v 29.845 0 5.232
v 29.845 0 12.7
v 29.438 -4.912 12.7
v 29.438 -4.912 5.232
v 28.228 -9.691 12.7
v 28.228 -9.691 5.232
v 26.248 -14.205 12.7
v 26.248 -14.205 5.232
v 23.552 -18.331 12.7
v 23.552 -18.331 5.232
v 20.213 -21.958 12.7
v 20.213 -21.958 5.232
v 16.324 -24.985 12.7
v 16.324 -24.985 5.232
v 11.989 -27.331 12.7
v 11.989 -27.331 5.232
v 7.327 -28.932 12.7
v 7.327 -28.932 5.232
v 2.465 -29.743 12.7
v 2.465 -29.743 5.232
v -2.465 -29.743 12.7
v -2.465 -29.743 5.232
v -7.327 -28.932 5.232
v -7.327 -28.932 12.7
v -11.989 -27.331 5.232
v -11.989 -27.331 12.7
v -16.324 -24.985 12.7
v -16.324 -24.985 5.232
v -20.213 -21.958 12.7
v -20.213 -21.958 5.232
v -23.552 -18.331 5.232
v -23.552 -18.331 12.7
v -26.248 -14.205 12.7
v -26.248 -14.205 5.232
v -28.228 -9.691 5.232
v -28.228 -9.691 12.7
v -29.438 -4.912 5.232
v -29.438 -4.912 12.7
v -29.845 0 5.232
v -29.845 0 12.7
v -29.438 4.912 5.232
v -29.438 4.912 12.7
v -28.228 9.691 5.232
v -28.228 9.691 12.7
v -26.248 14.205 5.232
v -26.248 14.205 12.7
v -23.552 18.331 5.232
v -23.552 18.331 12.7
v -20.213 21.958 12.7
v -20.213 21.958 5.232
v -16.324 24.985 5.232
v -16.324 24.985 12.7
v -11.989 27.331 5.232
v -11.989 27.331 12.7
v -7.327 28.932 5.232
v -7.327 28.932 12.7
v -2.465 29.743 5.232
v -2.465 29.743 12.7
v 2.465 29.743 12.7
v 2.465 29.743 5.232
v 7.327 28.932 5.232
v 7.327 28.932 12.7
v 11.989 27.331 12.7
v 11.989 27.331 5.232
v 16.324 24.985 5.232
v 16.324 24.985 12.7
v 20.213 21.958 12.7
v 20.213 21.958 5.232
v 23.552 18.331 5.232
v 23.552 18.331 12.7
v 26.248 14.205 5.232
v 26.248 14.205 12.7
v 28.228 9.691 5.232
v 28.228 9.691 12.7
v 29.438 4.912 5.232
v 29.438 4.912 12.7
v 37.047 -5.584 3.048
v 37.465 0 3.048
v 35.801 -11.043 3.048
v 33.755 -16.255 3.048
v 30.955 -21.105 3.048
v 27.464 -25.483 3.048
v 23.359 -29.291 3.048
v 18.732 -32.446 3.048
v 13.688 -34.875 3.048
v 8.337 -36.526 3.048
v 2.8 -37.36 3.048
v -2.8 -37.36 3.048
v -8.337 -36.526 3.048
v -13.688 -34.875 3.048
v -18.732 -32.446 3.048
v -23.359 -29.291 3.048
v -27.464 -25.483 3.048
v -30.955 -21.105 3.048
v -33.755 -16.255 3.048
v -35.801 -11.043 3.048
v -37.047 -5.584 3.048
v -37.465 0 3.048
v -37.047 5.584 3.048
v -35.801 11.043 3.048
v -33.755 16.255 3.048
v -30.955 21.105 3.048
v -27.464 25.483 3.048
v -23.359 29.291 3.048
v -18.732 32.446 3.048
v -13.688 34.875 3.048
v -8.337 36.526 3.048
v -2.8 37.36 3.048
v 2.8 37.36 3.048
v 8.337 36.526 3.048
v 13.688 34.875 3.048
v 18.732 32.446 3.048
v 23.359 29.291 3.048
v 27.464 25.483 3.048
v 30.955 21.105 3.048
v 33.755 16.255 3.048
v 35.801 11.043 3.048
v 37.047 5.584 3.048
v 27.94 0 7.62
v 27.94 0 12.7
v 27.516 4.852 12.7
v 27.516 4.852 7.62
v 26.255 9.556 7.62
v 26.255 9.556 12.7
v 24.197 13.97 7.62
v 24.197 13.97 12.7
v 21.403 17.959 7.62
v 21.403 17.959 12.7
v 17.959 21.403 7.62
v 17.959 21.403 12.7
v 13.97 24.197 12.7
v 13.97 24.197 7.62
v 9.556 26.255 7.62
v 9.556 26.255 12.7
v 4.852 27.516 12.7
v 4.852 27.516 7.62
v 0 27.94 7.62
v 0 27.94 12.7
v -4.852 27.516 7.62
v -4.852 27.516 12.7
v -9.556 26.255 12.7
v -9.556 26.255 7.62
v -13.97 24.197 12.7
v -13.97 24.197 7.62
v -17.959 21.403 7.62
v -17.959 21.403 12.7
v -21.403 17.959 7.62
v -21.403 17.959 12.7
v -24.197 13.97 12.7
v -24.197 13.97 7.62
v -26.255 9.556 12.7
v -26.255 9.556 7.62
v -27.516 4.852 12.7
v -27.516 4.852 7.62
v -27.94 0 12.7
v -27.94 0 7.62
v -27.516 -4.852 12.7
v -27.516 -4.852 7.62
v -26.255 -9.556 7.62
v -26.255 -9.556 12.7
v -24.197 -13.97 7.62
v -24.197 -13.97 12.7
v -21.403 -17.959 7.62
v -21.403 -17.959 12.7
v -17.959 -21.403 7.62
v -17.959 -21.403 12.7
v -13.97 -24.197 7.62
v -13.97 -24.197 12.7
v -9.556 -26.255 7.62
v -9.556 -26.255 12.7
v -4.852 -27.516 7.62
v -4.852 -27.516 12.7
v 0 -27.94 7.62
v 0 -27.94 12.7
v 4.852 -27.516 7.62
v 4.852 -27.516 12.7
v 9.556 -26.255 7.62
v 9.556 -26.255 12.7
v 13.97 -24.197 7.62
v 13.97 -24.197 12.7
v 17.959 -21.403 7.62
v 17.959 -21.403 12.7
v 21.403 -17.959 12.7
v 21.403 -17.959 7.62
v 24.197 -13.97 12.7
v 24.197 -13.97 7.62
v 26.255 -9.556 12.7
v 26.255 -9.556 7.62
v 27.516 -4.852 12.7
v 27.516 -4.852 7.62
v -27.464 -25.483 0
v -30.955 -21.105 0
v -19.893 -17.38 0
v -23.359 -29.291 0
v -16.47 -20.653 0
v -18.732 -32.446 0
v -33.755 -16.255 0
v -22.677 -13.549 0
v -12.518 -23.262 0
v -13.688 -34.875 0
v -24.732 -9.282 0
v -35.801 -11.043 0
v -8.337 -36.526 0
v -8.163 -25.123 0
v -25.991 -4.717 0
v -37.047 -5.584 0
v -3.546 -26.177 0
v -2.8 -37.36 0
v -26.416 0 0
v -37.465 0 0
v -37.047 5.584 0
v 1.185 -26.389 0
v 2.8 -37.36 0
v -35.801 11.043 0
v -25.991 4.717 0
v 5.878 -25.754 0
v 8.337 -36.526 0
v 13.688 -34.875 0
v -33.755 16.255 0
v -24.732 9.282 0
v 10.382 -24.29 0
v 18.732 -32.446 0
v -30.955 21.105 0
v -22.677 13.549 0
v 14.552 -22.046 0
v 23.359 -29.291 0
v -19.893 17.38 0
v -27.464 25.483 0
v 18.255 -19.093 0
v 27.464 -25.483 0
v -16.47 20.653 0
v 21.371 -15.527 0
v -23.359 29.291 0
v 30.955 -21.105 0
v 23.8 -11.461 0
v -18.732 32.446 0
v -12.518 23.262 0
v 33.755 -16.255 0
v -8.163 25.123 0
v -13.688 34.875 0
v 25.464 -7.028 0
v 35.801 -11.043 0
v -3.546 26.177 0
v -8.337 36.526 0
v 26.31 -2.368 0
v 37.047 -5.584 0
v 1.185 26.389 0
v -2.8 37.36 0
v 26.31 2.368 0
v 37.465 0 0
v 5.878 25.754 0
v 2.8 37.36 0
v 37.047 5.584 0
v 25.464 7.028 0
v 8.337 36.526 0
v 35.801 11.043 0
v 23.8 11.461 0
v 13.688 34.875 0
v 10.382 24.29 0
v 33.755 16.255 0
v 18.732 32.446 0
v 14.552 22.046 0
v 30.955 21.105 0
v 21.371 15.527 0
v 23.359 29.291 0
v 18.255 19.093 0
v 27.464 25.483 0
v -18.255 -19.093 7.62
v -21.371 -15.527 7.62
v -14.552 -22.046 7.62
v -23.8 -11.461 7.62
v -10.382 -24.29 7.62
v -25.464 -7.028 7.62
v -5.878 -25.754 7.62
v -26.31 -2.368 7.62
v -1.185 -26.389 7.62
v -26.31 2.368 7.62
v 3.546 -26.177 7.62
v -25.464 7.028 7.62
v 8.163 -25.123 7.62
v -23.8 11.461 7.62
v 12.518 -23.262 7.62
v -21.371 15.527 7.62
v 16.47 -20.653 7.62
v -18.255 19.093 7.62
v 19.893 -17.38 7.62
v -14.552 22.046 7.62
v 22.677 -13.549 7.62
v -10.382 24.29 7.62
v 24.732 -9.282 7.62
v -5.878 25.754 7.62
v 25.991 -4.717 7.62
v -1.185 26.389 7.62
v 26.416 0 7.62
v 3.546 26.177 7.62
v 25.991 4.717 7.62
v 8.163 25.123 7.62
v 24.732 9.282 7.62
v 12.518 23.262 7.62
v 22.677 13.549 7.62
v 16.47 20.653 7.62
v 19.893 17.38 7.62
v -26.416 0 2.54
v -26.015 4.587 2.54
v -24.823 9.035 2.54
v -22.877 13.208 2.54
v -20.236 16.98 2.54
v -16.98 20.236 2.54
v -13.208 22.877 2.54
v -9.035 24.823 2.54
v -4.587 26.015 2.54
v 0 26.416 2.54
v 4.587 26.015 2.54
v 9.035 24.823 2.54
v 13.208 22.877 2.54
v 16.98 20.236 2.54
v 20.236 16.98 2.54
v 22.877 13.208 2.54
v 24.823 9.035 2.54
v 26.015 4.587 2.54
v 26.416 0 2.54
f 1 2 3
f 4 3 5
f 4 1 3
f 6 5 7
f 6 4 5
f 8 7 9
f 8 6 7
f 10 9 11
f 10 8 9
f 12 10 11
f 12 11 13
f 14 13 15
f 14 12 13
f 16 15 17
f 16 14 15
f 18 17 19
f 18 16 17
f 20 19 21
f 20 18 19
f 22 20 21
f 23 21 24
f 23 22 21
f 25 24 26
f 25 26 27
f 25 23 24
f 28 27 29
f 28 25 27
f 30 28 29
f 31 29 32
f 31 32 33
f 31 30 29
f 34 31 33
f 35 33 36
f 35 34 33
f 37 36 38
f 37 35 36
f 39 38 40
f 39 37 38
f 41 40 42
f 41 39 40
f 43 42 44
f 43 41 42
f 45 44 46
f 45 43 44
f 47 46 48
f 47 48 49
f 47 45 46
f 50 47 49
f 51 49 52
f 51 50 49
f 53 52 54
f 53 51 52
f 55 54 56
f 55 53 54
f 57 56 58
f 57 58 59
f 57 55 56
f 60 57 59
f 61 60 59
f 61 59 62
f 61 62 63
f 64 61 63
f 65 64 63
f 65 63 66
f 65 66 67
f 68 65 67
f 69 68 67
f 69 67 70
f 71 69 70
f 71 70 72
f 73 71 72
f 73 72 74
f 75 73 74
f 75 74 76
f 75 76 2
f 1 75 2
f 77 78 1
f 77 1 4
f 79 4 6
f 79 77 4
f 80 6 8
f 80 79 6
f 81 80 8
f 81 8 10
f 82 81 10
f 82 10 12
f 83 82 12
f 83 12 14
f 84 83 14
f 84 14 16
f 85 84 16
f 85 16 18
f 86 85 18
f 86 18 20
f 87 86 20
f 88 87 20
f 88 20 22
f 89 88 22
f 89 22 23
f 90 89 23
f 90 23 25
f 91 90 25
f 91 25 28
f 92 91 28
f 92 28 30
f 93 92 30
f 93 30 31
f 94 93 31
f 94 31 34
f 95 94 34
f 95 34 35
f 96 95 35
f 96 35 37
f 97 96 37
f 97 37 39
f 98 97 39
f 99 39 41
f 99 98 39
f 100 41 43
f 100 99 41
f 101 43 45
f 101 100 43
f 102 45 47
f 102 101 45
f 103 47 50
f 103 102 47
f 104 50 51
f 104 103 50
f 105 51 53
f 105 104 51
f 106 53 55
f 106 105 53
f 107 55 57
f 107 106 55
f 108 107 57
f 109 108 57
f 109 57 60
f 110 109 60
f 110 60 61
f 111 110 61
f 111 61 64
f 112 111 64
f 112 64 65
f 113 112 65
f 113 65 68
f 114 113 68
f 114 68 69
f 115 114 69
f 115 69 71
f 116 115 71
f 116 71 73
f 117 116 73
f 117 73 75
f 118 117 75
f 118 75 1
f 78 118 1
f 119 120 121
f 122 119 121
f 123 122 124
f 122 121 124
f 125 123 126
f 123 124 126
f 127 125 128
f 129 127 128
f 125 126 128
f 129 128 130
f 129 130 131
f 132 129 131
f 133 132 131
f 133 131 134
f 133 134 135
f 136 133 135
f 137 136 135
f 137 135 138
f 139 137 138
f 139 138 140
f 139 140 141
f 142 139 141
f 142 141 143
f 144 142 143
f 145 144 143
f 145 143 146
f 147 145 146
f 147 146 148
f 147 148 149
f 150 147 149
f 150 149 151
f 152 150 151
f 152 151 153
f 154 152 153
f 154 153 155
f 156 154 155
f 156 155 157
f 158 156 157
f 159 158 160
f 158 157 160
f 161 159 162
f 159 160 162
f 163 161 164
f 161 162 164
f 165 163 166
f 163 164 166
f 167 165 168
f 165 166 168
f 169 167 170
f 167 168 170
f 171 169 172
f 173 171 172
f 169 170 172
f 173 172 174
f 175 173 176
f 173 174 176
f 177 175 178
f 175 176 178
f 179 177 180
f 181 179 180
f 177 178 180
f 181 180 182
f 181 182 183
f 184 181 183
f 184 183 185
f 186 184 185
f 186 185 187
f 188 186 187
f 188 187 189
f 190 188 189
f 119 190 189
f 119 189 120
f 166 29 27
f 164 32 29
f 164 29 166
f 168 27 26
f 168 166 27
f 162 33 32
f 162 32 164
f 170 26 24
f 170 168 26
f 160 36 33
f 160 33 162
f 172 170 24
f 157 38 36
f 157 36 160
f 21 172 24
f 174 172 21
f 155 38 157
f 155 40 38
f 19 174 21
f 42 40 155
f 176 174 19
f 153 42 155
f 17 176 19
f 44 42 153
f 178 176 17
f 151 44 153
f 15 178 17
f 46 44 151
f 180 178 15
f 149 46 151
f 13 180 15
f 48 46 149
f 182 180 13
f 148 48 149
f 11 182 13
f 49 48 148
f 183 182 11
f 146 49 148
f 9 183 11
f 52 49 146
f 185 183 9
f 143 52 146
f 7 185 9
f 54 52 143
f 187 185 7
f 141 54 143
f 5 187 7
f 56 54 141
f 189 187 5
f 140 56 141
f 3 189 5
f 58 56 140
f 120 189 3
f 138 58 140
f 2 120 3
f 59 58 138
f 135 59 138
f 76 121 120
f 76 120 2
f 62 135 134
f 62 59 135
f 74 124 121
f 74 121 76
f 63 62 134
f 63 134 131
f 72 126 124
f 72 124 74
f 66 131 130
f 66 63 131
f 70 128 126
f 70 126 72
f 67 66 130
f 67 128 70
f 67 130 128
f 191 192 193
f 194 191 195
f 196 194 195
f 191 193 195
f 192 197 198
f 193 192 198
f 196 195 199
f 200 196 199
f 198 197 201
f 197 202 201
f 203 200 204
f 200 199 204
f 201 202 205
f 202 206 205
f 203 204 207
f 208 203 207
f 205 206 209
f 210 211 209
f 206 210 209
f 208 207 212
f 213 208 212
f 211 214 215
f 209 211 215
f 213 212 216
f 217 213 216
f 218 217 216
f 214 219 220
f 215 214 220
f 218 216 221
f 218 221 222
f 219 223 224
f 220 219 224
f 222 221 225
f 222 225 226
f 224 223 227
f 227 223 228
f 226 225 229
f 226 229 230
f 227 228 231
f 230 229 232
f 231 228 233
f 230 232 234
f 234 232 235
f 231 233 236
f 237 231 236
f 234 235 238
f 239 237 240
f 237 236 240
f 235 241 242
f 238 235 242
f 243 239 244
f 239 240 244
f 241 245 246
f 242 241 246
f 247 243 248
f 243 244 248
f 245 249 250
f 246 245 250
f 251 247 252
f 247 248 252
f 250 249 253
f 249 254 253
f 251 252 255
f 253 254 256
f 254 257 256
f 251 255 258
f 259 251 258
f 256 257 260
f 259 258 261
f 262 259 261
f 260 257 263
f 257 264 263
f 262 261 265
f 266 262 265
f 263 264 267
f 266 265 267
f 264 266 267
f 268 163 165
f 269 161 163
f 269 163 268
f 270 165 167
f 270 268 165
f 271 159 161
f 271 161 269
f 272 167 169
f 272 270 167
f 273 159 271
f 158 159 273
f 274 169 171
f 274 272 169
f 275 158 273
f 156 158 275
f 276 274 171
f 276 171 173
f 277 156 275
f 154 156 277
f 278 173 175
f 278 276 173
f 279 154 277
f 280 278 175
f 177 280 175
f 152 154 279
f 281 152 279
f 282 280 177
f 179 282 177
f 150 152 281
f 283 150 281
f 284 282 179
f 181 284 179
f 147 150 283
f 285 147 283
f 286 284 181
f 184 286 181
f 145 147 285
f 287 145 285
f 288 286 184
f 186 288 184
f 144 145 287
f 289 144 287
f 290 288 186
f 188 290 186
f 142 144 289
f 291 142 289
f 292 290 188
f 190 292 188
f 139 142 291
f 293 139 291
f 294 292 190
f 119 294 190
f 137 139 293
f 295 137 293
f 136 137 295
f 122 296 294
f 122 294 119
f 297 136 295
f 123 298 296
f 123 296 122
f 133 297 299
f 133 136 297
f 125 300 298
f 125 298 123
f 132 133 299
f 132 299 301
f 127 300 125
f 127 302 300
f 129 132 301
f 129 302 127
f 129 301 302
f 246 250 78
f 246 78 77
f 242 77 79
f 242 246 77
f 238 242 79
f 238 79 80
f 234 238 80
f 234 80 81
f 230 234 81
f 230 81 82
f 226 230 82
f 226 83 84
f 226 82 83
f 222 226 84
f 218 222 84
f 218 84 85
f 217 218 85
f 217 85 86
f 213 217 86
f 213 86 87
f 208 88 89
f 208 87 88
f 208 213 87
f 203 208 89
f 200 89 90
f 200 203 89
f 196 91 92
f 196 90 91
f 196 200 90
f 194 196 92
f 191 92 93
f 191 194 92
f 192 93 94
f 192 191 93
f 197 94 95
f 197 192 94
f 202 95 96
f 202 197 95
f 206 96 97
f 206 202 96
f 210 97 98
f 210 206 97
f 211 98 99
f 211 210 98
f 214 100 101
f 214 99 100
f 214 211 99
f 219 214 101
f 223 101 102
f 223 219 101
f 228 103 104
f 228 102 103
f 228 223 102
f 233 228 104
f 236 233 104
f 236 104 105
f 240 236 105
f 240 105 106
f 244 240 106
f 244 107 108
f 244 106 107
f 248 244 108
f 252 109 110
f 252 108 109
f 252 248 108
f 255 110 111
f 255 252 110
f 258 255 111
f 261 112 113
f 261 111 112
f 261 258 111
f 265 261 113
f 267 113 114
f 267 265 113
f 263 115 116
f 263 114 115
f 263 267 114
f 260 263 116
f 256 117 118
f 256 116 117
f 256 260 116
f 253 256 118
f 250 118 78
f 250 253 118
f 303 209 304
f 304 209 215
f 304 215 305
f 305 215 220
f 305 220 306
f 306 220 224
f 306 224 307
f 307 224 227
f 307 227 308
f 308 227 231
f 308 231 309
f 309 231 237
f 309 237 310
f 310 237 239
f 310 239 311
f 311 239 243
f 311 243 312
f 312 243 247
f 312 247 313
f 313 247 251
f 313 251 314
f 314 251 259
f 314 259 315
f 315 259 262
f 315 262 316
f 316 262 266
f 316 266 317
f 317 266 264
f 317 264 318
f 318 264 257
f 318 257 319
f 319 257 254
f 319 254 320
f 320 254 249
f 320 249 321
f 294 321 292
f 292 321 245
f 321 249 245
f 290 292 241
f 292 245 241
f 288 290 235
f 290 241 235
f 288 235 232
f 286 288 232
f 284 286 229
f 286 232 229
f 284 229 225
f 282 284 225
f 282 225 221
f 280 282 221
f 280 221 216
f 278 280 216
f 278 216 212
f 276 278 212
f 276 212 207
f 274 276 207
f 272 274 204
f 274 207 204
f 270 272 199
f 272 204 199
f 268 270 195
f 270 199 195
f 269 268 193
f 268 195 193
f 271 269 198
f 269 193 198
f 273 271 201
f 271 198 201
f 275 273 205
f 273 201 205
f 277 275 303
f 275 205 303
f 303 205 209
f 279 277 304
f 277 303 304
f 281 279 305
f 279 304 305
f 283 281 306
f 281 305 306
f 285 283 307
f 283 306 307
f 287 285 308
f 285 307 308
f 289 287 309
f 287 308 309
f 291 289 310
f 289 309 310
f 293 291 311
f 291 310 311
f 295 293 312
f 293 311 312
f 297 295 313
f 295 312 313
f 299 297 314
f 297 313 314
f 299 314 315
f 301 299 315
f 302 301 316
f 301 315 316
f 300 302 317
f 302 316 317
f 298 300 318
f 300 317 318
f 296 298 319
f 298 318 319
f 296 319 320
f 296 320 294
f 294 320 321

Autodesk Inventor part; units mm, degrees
ref_plane "YZ Plane" through (0, 0, 0) normal (1, 0, 0) x (0, 1, 0)
ref_plane "XZ Plane" through (0, 0, 0) normal (0, 1, 0) x (-1, 0, 0)
sketch "Sketch1" plane through (0, 0, 0) normal (0, 0, 1) x (1, 0, 0)
  circle A0 centre (0, 0) radius 37.465
  dimension "d0" = 74.93
extrude "Extrusion1" add sketch "Sketch1" along normal blind 12.7
sketch "Sketch3" plane through (0, 0, 12.7) normal (0, 0, 1) x (1, 0, 0)
  circle A0 centre (0, 0) radius 26.289
  dimension "d6" = 52.578
extrude "Extrusion3" cut sketch "Sketch3" against normal blind 2.54
sketch "Sketch4" plane through (0, 0, 0) normal (0, 0, -1) x (-1, 0, 0)
  circle A0 centre (0, 0) radius 26.416
  dimension "d9" = 52.832
extrude "Extrusion4" cut sketch "Sketch4" against normal blind 2.54
ref_plane "Work Plane1" through (0, 0, 12.7) normal (0, 0, 1) x (1, 0, 0)
ref_plane "Work Plane3" through (0, 0, 5.2324) normal (0, 0, 1) x (1, 0, 0)
ref_plane "Work Plane5" through (0, 0, 3.048) normal (0, 0, 1) x (1, 0, 0)
sketch "Sketch9" plane through (0, 0, 5.2324) normal (0, 0, 1) x (1, 0, 0)
  circle A0 centre (0, 0) radius 29.845 projected
sketch "Sketch11" plane through (0, 0, 3.048) normal (0, 0, 1) x (1, 0, 0)
  circle A0 centre (0, 0) radius 29.845
  circle A1 centre (0, 0) radius 37.465
  dimension "d42" = 59.69
  dimension "d43" = 74.93
extrude "Extrusion7" cut sketch "Sketch11" along normal through all
loft "Loft5" add profiles "Sketch9" section 2 edges at (-37.465, 0, 3.048)
sketch "Sketch12" plane through (0, 0, 12.7) normal (0, 0, 1) x (1, 0, 0)
  circle A0 centre (0, 0) radius 27.94
  circle A1 centre (0, 0) radius 26.289
  dimension "d50" = 55.88
extrude "Extrusion8" cut sketch "Sketch12" against normal blind 5.08
sketch "Sketch2" plane through (0, 0, 12.7) normal (0, 0, 1) x (1, 0, 0)
  circle A0 centre (0, 0) radius 26.416
  dimension "d3" = 52.832
extrude "Extrusion2" cut sketch "Sketch2" against normal blind 50.8
properties part number "KF50tube_v3"
